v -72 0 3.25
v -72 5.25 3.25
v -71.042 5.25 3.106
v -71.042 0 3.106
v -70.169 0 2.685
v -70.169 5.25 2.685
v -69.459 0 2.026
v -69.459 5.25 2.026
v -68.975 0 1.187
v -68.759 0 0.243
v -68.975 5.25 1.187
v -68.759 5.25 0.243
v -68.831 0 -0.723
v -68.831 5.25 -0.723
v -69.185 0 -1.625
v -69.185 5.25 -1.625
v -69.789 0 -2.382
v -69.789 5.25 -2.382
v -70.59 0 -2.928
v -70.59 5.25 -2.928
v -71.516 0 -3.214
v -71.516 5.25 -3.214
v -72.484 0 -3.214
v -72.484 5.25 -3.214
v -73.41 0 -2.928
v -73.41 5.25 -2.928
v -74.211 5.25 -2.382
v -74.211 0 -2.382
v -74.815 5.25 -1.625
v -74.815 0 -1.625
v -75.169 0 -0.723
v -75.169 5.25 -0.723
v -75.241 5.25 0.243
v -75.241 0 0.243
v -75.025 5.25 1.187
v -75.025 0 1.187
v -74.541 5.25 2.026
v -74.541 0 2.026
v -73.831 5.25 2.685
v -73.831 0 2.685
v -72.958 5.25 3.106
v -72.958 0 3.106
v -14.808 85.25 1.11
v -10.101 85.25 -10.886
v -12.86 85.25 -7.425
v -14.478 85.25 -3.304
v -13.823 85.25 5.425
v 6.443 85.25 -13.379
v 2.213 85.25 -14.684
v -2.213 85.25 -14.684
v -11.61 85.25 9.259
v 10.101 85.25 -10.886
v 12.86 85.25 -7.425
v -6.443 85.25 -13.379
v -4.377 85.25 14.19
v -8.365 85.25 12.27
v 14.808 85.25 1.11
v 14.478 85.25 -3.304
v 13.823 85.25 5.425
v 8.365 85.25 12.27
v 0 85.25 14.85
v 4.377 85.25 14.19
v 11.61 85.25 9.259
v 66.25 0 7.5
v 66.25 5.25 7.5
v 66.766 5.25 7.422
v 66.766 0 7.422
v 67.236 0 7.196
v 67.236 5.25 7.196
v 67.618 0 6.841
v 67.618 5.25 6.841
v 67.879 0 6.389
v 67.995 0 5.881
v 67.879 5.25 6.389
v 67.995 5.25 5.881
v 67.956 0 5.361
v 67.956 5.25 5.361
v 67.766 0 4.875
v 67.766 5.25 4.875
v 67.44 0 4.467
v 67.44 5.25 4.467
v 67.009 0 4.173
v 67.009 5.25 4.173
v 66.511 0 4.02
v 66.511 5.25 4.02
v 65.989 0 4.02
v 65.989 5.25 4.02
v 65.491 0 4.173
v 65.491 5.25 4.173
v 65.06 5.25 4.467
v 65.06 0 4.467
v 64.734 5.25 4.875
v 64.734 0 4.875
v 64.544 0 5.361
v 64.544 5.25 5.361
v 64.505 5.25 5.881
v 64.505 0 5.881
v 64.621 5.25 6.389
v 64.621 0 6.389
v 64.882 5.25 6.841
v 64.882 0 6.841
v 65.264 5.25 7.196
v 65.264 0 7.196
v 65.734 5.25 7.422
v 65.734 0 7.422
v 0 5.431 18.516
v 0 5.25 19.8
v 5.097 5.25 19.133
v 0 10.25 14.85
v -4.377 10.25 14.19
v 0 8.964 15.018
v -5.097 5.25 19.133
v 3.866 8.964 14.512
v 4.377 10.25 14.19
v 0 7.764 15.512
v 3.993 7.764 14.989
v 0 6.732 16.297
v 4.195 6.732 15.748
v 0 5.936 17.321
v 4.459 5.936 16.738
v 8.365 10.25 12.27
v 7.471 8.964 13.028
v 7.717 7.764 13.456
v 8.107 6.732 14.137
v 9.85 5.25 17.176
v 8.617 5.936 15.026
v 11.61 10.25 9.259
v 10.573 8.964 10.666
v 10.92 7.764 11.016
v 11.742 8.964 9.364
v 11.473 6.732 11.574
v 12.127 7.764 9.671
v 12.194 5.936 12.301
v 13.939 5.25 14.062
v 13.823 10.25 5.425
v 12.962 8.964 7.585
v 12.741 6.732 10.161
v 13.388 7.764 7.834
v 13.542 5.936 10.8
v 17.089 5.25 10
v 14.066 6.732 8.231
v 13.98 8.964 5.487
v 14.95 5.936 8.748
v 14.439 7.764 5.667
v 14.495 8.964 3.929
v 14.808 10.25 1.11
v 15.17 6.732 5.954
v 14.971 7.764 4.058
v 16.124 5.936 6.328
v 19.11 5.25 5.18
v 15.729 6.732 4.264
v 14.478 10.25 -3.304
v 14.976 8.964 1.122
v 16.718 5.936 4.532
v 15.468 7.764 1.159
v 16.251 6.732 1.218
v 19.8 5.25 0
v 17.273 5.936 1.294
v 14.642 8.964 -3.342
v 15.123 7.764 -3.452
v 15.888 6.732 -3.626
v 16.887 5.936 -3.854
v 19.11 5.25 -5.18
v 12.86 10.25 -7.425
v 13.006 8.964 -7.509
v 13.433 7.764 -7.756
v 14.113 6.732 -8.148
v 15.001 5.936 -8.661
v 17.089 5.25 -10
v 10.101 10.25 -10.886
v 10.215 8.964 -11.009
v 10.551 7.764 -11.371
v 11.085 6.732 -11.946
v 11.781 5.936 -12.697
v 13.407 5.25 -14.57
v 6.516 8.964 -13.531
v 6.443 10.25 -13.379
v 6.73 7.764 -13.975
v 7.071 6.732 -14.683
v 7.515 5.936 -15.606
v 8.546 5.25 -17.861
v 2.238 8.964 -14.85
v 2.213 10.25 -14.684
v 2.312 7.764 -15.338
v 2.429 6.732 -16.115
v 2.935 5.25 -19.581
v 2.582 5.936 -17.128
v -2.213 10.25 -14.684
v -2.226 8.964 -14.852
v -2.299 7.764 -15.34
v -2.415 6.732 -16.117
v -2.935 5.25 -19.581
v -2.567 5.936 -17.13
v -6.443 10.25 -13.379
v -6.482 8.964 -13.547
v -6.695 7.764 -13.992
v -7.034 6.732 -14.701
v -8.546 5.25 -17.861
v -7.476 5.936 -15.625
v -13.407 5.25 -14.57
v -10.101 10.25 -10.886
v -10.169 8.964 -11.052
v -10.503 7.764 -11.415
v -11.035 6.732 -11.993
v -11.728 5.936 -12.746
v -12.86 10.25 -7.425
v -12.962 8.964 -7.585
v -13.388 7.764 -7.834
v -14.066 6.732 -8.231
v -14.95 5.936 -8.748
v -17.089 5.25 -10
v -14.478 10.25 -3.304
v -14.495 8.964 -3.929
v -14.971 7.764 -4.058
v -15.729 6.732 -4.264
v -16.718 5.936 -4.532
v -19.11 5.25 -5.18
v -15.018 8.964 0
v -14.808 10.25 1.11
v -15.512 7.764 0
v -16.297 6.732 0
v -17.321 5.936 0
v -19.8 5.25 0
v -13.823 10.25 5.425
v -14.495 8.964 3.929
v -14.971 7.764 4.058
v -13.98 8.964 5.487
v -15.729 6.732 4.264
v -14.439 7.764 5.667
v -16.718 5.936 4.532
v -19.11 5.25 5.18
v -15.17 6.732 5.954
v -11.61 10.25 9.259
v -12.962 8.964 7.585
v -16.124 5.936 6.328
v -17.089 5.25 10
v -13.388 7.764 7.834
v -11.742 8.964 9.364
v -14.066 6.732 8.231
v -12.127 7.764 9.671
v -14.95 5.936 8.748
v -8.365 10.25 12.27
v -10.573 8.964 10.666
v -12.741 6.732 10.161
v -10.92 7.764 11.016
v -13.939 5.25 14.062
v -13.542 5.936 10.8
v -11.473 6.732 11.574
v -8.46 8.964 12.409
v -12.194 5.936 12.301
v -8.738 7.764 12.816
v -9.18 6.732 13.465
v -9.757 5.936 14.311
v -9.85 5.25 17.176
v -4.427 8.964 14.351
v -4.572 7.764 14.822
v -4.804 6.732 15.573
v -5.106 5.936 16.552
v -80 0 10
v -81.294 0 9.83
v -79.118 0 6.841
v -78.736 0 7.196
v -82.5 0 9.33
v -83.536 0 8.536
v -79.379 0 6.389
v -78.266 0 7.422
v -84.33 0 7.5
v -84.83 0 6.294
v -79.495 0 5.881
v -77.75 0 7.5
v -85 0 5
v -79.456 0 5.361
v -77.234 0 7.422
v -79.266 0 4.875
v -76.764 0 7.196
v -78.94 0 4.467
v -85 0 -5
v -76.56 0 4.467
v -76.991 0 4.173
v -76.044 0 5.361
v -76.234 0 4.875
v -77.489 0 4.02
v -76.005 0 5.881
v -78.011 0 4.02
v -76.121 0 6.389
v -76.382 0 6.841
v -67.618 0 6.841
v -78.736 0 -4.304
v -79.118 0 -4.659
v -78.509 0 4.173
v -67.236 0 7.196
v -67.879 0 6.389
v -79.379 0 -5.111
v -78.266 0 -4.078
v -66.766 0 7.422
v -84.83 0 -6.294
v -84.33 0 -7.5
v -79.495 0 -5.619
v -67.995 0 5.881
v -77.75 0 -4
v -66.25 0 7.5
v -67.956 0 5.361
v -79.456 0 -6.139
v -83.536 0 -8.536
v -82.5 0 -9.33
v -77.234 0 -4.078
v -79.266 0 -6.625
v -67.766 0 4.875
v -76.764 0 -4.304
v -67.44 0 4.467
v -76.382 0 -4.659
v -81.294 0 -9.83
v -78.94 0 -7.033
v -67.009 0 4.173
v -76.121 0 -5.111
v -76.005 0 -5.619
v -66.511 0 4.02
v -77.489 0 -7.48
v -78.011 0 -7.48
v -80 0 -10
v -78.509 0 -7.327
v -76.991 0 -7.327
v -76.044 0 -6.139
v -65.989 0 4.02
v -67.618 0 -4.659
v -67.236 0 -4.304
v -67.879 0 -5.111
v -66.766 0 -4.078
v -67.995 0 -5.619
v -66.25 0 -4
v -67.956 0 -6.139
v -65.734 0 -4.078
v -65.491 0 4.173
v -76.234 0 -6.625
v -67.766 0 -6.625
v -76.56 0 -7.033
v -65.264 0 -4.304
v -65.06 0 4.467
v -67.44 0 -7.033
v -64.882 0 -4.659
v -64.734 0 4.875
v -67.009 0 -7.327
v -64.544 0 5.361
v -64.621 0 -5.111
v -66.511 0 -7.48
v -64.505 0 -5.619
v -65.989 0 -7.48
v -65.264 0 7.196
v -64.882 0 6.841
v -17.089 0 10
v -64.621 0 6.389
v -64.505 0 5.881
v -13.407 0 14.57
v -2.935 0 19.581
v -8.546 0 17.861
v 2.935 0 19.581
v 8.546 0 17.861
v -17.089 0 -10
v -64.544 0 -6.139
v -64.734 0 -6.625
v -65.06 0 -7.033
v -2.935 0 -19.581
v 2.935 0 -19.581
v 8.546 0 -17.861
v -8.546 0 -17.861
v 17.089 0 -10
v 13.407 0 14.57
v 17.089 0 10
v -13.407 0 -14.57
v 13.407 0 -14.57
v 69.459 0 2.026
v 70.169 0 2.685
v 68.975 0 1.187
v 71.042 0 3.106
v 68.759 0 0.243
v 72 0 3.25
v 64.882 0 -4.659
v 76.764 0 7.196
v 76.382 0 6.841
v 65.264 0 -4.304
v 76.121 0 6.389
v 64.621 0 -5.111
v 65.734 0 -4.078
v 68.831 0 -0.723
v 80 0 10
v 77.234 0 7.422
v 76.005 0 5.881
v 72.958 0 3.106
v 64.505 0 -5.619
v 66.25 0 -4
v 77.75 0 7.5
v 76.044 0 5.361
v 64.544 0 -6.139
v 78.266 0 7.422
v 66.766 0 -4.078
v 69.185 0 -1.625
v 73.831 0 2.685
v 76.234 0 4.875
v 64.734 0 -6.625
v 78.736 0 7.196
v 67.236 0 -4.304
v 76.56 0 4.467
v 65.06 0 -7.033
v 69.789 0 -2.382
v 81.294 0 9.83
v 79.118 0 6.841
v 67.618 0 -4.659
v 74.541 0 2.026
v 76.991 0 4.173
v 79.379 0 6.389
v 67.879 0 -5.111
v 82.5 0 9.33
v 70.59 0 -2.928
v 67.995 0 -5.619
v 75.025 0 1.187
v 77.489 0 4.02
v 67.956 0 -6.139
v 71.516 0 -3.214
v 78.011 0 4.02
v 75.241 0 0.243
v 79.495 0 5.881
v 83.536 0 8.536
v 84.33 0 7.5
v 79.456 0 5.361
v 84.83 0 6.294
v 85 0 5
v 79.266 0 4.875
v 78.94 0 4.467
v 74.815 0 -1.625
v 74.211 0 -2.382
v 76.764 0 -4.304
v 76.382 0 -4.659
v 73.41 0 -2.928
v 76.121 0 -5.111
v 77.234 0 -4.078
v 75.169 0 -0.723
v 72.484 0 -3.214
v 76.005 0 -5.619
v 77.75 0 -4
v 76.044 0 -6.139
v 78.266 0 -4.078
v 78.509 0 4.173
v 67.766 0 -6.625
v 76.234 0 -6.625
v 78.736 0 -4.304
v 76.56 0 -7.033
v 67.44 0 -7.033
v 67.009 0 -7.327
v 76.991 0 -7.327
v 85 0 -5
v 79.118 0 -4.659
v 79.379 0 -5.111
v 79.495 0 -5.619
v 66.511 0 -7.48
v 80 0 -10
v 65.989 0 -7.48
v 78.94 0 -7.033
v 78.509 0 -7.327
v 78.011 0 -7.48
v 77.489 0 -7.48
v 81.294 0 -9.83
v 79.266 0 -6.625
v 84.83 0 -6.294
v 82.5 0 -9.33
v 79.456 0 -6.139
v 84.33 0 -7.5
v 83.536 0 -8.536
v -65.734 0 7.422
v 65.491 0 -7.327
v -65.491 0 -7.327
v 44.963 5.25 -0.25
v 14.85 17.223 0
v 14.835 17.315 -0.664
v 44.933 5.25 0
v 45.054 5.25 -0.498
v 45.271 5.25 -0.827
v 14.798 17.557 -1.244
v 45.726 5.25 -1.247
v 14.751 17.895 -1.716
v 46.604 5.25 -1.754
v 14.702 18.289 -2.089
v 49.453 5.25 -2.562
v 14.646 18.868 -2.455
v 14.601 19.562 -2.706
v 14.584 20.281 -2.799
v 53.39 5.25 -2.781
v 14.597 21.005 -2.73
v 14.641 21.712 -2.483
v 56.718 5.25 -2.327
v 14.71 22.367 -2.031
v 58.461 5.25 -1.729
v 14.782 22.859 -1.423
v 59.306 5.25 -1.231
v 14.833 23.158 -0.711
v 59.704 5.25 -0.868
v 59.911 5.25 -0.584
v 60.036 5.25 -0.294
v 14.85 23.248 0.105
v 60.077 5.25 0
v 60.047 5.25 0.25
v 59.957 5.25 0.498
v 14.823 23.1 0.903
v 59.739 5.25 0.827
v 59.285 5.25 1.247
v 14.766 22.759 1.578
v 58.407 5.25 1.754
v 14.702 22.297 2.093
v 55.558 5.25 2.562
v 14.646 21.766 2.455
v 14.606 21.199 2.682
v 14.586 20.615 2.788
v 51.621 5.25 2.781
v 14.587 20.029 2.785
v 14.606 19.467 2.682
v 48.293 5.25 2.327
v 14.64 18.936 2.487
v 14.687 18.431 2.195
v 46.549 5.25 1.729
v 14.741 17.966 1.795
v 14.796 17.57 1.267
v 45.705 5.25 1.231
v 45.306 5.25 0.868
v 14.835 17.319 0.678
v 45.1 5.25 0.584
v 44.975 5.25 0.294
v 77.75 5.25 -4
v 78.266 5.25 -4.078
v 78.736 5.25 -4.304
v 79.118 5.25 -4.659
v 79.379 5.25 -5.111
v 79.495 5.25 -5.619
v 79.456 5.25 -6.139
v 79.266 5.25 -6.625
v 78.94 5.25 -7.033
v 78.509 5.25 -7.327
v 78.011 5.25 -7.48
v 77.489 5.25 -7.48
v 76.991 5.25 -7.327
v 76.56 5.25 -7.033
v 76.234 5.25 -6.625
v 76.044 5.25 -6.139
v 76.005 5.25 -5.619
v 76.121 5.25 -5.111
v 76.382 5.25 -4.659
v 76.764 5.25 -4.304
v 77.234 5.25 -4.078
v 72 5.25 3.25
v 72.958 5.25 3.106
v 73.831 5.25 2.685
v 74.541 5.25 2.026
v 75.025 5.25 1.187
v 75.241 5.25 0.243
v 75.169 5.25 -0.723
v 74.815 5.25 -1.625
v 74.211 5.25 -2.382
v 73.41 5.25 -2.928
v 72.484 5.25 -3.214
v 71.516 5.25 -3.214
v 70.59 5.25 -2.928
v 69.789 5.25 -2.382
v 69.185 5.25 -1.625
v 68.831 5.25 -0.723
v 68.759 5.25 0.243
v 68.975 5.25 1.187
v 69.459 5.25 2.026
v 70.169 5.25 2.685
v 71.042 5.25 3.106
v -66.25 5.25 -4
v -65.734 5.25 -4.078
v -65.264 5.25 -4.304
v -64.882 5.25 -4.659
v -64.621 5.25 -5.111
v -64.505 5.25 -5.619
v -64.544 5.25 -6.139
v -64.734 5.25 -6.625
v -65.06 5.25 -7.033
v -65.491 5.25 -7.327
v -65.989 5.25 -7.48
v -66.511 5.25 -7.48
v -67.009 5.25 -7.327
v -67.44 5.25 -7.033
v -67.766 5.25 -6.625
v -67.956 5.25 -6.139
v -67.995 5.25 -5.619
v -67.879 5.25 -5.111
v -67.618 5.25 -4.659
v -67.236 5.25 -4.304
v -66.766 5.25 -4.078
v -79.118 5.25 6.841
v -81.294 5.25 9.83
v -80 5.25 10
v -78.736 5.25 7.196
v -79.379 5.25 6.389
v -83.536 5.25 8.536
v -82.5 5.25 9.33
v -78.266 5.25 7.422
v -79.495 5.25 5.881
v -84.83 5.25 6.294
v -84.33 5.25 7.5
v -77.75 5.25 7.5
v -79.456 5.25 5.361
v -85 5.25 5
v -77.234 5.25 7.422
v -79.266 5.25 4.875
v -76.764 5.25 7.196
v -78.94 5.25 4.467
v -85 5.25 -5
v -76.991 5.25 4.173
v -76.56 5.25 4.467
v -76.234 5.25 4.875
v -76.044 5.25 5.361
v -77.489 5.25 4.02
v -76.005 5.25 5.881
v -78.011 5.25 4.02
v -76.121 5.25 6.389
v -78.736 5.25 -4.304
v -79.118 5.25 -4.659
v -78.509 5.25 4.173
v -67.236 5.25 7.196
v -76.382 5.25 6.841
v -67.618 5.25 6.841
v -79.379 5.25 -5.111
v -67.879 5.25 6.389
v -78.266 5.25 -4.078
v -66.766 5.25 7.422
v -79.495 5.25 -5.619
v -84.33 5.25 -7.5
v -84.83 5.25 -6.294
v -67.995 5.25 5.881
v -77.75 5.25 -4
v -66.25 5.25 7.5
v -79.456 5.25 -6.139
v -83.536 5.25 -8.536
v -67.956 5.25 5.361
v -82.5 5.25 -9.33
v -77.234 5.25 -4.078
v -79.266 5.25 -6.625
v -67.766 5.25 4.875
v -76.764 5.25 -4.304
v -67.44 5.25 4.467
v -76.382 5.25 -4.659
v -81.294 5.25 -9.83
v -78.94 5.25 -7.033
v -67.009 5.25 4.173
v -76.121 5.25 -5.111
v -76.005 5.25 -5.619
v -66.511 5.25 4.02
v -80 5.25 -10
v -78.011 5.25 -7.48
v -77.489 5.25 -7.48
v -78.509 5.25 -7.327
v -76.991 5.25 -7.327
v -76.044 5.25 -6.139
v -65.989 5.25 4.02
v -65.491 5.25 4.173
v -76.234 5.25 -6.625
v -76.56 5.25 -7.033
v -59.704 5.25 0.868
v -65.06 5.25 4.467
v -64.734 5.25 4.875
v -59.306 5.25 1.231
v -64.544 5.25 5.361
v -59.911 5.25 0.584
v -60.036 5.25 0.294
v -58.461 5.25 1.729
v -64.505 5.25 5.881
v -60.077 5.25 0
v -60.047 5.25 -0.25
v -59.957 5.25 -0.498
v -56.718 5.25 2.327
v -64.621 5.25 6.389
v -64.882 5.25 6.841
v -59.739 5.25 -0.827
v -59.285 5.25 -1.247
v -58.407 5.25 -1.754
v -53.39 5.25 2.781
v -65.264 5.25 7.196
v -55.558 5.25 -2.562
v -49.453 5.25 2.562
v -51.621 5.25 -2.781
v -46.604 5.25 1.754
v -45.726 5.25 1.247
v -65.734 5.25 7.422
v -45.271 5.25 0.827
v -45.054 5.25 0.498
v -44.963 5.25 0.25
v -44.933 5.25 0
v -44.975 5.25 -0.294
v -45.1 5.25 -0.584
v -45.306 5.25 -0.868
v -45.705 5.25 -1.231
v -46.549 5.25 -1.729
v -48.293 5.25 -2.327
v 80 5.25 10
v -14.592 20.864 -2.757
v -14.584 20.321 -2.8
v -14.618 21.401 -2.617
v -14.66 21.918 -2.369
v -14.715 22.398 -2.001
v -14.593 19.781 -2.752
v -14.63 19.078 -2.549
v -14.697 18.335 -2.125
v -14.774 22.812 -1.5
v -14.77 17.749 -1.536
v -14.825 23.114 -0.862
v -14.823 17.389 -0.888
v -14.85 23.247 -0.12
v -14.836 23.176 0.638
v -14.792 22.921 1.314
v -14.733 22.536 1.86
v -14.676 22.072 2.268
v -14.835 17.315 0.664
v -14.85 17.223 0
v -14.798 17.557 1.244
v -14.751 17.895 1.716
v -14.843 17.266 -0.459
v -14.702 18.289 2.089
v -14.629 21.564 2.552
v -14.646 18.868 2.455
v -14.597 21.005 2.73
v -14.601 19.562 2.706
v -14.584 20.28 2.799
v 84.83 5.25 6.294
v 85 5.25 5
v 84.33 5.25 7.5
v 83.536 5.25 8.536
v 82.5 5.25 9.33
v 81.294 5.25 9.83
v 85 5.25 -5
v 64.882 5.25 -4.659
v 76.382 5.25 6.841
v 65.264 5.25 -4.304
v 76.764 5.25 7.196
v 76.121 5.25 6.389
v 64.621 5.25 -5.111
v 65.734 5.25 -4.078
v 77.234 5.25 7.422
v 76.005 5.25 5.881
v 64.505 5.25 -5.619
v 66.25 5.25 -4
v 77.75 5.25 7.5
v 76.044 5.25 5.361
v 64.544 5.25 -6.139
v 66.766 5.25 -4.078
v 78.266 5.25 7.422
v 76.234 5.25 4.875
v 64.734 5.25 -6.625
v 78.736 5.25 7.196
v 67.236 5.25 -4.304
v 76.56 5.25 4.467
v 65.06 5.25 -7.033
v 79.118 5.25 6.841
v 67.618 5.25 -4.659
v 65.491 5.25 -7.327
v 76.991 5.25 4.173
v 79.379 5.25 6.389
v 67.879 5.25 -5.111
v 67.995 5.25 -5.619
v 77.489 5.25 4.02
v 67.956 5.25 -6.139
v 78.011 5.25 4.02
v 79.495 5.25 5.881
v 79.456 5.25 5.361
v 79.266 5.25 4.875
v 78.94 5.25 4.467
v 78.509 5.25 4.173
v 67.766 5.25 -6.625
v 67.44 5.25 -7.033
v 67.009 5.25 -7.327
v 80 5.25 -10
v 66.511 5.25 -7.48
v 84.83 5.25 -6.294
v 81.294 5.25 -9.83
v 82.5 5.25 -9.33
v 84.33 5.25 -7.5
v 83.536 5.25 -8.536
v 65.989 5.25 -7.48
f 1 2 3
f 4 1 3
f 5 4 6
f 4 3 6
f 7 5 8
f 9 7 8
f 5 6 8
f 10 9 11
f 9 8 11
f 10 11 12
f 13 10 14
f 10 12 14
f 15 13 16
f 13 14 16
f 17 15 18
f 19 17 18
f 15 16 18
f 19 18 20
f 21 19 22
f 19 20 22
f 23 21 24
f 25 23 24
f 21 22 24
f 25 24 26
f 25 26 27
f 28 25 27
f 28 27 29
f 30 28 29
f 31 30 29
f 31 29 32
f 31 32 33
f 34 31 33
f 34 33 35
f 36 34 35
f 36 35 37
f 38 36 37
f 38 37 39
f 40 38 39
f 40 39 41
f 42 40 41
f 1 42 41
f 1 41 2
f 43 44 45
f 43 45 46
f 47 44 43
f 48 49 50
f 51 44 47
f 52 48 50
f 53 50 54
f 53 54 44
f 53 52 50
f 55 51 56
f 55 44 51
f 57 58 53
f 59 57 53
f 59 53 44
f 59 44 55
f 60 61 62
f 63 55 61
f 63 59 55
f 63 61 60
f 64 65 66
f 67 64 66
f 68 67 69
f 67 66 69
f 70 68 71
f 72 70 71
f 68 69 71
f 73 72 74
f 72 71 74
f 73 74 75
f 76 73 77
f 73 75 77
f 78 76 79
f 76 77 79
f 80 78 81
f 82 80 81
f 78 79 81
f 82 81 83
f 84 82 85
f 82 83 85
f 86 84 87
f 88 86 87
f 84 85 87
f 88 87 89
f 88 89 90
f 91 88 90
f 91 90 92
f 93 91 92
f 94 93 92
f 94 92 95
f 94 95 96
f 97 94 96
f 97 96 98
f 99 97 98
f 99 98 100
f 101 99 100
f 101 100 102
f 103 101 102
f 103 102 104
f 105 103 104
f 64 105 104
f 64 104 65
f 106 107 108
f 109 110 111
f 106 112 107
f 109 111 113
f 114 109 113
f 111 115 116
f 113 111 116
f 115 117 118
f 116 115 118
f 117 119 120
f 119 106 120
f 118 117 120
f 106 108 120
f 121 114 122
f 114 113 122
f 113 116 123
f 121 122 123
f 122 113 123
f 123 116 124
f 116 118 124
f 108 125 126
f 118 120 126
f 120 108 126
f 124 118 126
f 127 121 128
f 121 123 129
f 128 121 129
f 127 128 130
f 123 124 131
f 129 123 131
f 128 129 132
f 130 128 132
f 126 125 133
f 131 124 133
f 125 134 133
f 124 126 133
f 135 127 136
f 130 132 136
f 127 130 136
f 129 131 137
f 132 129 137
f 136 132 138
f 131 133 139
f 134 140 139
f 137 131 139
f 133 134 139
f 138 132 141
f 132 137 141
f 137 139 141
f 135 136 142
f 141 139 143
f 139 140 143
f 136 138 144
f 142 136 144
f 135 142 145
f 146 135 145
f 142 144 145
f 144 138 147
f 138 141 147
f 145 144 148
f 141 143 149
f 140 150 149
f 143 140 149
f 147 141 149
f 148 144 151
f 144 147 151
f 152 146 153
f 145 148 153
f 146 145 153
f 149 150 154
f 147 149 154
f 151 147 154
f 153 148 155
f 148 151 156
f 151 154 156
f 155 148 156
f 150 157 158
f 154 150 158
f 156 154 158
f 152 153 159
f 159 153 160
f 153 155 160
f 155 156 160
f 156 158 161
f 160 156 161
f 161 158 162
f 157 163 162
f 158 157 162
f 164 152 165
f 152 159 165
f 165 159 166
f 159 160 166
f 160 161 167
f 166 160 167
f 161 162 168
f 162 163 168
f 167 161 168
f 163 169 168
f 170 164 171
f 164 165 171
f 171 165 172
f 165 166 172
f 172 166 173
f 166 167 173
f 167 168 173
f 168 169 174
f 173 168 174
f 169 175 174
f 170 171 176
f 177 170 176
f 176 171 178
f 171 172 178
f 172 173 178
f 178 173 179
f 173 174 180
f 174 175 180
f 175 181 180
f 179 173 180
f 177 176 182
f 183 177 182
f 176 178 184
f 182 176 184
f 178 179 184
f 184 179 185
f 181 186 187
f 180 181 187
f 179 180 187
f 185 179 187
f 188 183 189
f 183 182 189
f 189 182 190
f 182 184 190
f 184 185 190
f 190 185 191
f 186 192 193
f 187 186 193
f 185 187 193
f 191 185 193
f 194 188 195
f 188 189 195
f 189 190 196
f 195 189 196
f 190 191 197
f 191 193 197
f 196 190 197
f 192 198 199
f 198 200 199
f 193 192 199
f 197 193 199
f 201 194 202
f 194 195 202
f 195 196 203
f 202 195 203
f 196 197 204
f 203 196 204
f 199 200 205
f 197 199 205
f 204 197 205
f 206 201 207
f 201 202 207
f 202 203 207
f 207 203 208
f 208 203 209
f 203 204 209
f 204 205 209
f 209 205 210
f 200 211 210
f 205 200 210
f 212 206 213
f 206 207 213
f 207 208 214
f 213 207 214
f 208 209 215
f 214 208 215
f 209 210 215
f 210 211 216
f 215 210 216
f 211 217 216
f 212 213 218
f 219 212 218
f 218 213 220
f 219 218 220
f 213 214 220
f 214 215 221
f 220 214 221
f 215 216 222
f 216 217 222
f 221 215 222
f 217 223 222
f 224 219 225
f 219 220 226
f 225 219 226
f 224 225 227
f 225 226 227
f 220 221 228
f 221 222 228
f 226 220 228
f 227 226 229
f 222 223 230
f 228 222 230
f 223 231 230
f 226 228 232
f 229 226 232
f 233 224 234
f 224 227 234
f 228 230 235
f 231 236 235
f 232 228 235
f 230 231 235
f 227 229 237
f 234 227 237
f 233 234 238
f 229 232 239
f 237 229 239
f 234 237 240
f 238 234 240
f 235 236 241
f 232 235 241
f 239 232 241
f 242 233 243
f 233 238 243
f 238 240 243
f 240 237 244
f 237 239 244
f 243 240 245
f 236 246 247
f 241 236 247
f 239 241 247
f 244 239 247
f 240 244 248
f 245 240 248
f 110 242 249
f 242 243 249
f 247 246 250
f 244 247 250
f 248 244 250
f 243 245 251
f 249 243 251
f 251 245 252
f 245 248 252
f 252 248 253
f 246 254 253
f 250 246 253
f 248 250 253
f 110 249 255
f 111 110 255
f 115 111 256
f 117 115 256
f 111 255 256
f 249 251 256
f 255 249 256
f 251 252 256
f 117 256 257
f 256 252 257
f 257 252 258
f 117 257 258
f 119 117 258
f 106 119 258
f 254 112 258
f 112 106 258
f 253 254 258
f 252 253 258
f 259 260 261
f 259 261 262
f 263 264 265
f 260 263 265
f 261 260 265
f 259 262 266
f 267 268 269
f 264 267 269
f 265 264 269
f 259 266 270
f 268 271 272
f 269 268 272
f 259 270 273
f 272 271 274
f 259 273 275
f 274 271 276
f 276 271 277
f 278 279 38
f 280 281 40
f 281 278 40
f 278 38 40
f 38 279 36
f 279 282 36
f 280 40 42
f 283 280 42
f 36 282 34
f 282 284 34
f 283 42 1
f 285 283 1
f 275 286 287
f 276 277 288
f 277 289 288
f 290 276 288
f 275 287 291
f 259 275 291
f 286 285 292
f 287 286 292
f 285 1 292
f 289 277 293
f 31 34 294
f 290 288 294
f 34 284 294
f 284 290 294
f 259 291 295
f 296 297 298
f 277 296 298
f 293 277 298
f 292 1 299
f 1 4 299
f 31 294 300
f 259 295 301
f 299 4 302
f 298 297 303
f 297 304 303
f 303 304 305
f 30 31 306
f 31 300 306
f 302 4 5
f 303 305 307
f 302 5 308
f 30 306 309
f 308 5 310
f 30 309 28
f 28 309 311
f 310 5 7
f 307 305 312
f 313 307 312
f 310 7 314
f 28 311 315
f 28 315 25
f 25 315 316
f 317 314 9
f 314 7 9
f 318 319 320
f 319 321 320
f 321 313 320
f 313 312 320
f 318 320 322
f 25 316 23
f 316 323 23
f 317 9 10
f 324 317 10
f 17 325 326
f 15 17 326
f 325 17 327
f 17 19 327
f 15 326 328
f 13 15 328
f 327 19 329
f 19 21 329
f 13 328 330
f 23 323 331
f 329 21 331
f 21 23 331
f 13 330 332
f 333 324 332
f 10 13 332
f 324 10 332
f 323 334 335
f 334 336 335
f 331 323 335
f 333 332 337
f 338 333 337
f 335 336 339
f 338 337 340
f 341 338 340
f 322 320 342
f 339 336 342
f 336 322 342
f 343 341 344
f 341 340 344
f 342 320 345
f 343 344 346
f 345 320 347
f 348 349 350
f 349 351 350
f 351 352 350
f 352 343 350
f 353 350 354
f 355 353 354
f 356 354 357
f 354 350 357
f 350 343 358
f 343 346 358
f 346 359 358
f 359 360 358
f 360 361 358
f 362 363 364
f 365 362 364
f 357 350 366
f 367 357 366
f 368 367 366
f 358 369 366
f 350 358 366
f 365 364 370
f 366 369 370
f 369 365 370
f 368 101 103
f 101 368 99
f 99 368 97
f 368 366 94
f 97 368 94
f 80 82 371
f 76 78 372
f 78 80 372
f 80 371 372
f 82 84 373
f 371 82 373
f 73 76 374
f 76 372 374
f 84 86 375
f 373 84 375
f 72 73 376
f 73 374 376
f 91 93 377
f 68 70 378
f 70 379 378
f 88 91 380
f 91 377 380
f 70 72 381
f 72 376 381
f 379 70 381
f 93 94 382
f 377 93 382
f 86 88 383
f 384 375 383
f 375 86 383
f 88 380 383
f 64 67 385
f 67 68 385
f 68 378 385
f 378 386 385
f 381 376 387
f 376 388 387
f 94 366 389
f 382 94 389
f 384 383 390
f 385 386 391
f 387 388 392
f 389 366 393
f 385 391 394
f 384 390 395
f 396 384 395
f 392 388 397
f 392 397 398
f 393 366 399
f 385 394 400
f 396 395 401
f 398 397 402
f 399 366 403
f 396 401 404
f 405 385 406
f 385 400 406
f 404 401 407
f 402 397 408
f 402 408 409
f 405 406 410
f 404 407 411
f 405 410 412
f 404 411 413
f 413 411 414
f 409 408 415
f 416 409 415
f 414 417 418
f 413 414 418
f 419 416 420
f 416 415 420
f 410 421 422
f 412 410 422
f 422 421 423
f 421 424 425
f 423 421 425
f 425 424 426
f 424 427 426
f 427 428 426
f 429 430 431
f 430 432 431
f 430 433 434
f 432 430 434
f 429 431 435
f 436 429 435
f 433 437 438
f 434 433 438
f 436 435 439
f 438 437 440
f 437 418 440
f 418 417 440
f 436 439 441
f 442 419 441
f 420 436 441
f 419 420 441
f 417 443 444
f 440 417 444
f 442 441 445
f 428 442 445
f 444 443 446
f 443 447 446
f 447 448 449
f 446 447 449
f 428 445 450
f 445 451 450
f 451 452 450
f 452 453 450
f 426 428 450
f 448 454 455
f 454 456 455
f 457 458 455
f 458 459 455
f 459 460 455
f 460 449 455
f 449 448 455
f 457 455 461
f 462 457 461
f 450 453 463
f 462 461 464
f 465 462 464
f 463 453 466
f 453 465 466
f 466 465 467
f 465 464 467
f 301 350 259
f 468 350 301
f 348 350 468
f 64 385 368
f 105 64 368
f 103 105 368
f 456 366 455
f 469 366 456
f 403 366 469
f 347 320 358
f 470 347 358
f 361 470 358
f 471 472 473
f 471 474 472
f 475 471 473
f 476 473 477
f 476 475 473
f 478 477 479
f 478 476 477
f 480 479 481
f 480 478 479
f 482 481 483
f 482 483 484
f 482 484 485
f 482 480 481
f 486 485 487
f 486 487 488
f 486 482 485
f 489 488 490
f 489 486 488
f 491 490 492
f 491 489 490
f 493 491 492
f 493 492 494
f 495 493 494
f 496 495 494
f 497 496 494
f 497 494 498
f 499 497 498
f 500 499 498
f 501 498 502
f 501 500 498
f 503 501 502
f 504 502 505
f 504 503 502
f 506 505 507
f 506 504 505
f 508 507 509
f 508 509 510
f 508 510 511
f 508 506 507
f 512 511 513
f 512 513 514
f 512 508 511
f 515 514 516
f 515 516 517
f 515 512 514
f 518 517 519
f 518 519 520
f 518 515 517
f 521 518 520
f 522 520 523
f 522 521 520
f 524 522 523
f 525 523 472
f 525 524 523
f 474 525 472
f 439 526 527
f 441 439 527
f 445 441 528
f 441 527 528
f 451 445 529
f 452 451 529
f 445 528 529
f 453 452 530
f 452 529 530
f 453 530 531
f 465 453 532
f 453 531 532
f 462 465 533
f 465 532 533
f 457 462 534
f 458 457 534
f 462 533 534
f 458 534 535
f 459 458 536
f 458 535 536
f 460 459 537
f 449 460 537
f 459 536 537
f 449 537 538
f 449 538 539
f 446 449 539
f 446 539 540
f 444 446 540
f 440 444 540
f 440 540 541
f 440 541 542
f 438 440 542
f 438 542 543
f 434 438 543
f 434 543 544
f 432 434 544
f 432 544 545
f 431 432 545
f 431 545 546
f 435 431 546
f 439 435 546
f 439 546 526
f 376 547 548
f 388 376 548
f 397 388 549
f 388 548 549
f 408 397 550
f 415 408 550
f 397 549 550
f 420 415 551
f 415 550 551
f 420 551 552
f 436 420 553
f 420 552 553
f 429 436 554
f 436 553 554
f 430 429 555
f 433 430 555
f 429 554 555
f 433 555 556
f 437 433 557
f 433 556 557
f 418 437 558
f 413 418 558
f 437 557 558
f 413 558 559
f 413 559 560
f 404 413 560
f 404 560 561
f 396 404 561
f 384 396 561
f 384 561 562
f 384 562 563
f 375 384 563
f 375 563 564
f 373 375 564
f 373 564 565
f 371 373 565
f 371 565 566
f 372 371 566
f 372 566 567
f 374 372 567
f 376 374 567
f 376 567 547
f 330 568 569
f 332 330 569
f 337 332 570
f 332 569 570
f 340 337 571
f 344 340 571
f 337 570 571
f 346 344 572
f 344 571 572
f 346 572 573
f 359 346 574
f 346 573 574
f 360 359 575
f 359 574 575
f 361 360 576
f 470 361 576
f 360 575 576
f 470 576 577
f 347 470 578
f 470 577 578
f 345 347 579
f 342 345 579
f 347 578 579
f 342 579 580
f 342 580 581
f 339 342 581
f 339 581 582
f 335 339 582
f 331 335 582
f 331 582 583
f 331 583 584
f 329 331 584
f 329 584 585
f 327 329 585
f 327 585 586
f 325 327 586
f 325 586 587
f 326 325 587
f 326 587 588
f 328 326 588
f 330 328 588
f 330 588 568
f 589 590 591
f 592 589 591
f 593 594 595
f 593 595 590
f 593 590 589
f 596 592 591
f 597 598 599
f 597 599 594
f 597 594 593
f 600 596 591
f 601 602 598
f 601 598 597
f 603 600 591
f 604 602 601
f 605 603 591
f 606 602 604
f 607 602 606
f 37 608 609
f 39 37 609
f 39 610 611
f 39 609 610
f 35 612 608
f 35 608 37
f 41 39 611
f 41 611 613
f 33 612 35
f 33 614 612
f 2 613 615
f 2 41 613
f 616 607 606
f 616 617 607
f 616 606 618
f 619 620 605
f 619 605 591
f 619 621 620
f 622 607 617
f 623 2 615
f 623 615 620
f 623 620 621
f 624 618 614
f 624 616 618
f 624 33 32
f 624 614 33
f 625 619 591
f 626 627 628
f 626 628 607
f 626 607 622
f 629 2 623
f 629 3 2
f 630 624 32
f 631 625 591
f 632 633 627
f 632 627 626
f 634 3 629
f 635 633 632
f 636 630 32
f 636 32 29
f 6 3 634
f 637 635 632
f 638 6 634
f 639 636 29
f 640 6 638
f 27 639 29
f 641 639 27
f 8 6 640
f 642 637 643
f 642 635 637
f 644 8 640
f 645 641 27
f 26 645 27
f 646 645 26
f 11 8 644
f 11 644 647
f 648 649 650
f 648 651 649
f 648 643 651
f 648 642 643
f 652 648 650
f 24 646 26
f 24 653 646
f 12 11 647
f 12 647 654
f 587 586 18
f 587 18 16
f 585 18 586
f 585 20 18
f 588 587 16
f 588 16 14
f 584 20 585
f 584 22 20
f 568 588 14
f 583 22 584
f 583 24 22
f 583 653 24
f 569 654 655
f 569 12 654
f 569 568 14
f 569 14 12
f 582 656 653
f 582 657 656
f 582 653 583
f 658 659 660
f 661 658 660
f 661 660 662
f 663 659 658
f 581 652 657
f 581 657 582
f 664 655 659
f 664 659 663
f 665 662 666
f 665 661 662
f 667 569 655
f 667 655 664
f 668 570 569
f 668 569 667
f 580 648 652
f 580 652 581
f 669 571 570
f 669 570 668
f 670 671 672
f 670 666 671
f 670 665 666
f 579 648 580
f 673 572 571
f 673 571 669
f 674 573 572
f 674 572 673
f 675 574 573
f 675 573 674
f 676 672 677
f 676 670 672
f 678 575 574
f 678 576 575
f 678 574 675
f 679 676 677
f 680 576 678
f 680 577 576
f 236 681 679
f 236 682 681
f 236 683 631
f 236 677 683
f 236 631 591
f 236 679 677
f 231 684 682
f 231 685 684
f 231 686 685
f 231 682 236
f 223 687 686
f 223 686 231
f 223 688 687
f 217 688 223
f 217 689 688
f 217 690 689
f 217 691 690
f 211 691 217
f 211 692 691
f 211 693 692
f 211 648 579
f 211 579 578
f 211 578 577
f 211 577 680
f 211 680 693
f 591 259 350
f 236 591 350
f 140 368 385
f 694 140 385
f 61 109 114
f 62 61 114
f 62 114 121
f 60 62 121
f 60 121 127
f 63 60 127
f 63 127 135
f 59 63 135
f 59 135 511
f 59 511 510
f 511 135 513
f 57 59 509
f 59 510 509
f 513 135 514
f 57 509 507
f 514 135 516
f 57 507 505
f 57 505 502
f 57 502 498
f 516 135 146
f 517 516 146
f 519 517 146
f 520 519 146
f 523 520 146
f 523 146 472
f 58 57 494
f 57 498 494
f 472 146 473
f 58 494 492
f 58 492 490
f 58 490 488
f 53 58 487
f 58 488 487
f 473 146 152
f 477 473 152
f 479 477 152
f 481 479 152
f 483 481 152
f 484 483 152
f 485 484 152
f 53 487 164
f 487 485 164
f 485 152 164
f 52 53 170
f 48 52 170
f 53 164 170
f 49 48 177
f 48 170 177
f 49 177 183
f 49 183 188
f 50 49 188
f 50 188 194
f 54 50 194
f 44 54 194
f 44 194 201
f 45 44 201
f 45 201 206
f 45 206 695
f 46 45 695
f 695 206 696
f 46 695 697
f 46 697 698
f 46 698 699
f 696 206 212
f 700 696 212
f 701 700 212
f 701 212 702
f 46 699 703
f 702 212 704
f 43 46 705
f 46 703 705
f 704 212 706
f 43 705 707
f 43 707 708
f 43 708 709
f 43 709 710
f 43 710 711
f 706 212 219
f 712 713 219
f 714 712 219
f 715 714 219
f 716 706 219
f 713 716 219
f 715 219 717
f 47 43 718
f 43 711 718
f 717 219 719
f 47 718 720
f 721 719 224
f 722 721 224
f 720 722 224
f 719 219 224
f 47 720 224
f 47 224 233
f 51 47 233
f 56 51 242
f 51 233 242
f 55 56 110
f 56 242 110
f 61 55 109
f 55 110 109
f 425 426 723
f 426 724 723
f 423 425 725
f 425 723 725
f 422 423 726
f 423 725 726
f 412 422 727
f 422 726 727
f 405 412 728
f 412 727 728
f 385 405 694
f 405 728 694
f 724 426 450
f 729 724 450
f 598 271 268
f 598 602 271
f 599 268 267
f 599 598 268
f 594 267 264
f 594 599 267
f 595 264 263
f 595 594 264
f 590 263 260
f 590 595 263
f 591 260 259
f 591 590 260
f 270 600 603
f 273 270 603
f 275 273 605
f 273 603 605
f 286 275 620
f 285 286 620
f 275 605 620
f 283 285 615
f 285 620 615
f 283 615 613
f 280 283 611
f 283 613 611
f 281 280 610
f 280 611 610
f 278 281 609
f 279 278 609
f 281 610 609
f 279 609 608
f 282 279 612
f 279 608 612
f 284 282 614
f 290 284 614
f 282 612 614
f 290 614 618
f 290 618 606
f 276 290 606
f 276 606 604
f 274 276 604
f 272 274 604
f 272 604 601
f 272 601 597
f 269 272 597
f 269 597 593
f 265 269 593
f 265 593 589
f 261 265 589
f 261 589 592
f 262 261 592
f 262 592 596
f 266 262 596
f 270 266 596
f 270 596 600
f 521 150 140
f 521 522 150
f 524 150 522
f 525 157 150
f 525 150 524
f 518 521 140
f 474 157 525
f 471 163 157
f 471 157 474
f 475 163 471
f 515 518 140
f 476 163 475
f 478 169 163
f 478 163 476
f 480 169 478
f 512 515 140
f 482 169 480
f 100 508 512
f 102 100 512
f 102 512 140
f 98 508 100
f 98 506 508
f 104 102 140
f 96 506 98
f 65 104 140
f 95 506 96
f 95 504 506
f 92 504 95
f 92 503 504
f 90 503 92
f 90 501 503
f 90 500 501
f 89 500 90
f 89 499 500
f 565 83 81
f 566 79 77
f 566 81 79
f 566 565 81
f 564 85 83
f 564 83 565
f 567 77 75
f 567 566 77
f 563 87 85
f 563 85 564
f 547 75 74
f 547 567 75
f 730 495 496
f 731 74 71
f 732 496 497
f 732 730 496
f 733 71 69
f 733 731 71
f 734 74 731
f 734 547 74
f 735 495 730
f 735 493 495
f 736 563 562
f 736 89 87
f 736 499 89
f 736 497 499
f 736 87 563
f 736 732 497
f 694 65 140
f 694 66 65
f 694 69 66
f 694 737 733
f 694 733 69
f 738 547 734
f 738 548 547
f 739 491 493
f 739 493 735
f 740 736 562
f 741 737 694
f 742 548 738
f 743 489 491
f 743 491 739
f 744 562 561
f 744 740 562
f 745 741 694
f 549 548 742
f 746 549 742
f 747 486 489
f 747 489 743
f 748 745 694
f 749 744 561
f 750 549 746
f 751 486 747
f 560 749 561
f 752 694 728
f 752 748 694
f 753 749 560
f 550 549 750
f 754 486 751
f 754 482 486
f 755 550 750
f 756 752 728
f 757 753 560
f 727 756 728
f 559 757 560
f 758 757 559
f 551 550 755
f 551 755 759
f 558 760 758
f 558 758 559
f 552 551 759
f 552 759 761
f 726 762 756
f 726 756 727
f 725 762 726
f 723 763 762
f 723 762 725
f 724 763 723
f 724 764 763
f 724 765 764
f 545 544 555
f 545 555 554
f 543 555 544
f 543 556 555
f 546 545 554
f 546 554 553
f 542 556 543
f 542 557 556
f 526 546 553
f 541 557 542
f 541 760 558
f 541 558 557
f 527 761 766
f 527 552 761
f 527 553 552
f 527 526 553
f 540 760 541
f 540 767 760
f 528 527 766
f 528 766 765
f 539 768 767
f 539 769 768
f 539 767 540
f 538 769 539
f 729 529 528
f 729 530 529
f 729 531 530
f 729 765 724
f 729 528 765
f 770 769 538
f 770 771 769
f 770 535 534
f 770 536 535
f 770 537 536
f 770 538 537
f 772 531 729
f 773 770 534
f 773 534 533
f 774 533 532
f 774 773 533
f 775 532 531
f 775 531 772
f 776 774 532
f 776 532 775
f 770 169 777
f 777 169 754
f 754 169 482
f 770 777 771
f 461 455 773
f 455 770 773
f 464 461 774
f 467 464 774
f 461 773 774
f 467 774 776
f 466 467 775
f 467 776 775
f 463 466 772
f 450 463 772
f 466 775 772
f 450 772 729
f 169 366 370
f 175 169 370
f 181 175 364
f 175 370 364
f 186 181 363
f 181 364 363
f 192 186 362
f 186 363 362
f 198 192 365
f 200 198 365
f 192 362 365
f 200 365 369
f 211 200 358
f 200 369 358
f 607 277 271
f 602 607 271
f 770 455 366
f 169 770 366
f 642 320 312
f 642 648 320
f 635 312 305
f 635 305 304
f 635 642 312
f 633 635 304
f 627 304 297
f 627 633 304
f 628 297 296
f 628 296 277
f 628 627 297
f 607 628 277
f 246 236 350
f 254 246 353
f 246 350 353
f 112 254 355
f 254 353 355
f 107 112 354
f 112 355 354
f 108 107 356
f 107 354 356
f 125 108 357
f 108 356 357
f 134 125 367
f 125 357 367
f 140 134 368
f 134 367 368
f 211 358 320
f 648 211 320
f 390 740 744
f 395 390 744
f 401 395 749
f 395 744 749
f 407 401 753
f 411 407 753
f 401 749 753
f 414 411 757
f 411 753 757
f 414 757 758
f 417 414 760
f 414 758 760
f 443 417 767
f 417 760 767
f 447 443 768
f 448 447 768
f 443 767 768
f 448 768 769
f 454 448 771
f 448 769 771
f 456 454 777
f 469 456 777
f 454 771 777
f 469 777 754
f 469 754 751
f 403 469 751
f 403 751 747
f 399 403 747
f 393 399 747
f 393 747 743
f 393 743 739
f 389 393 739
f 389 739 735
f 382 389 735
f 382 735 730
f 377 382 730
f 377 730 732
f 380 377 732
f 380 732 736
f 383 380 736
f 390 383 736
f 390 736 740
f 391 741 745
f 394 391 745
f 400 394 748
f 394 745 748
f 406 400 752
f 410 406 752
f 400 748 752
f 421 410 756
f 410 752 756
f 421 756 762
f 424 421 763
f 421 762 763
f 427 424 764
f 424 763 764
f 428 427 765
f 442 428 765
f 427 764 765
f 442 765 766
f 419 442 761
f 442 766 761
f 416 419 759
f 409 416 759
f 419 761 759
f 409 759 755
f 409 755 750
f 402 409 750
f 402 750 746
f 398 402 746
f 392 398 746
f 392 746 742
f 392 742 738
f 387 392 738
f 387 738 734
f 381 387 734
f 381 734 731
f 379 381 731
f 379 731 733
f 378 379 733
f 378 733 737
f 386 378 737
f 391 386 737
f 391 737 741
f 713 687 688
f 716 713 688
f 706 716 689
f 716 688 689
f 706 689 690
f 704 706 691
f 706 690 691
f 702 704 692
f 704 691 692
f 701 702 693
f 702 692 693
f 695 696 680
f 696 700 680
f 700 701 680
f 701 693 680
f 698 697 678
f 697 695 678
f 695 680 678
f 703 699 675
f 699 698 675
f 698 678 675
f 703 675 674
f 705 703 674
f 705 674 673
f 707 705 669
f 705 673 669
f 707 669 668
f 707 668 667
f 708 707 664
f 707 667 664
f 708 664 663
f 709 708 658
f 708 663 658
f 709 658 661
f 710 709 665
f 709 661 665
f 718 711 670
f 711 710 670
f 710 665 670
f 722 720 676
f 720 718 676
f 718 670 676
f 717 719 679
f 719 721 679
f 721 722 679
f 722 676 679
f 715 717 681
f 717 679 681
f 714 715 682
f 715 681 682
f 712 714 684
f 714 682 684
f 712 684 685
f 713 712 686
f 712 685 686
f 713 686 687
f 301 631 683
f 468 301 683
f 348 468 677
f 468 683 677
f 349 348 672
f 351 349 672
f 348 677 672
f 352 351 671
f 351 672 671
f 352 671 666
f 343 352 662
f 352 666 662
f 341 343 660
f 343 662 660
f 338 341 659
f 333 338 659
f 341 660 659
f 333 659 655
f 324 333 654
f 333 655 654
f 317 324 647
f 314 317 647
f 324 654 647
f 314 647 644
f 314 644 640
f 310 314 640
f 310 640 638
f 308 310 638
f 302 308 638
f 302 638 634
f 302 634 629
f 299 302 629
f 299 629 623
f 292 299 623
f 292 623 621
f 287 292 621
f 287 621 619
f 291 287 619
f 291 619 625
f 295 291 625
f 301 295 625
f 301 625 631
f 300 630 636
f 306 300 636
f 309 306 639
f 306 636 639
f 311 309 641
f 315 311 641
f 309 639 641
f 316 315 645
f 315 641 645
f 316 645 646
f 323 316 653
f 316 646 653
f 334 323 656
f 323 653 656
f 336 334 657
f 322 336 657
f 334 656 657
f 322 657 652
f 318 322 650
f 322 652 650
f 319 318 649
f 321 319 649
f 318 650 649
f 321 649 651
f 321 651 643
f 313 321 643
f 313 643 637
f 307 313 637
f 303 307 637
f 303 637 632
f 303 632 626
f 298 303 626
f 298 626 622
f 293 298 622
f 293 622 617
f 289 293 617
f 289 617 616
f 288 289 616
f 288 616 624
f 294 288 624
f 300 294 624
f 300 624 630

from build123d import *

# Parameters (mm, degrees)
BOSS_EXTRUDE1_DEPTH = 5.25
SKETCH3_R           = 14.850000000000001
BOSS_EXTRUDE2_DEPTH = 80
SKETCH2_R           = 1.749999999999997
SKETCH2_R_2         = 3.250000000000007
CUT_EXTRUDE1_DEPTH  = 119.39358090707452
FILLET8_R           = 5
FILLET9_R           = 5


with BuildPart() as part:
    # Sketch1 → Boss-Extrude1 (new body)
    with BuildSketch(Plane(origin=(0, 0, 0), x_dir=(1, 0, 0), z_dir=(0, 1, 0))):
        with BuildLine():
            Line((-85, -10.000000000000002), (-17.089177862027185, -10))
            ThreePointArc((-17.089177862027185, -10), (1.11e-15, -19.8), (17.089177862027185, -10))
            Line((17.089177862027185, -10), (85, -10.000000000000002))
            Line((85, -10.000000000000002), (85, 10))
            Line((85, 10), (17.089177862027185, 10))
            ThreePointArc((17.089177862027185, 10), (1.11e-15, 19.8), (-17.089177862027185, 10))
            Line((-17.089177862027185, 10), (-85, 10))
            Line((-85, 10), (-85, -10.000000000000002))
        make_face()
    extrude(amount=BOSS_EXTRUDE1_DEPTH)

    # Sketch3 → Boss-Extrude2 (add)
    with BuildSketch(Plane(origin=(0, 5.25, 0), x_dir=(1, 0, 0), z_dir=(0, 1, 0))):
        with Locations(Location((0, 0, 0), (0, 0, 270))):
            Circle(SKETCH3_R)
    extrude(amount=BOSS_EXTRUDE2_DEPTH)

    # Sketch2 → Cut-Extrude1 (cut, through all)
    with BuildSketch(Plane(origin=(0, 5.25, 0), x_dir=(1, 0, 0), z_dir=(0, 1, 0))):
        with Locations(Location((-77.75, 5.7499999999999964, 0), (0, 0, 270))):
            Circle(SKETCH2_R)
        with Locations(Location((-66.25, 5.7499999999999964, 0), (0, 0, 270))):
            Circle(SKETCH2_R)
        with Locations(Location((-66.25, -5.75, 0), (0, 0, 270))):
            Circle(SKETCH2_R)
        with Locations(Location((-77.75, -5.75, 0), (0, 0, 270))):
            Circle(SKETCH2_R)
        with Locations(Location((77.75, -5.75, 0), (0, 0, 270))):
            Circle(SKETCH2_R)
        with Locations(Location((66.25, -5.75, 0), (0, 0, 270))):
            Circle(SKETCH2_R)
        with Locations(Location((77.75, 5.7499999999999964, 0), (0, 0, 270))):
            Circle(SKETCH2_R)
        with Locations(Location((66.25, 5.7499999999999964, 0), (0, 0, 270))):
            Circle(SKETCH2_R)
        with Locations(Location((-72, -2.87e-15, 0), (0, 0, 270))):
            Circle(SKETCH2_R_2)
        with Locations(Location((72, -2.87e-15, 0), (0, 0, 270))):
            Circle(SKETCH2_R_2)
    extrude(amount=-CUT_EXTRUDE1_DEPTH, mode=Mode.SUBTRACT)

    # Sketch5 one side → Revolve1 (revolve)
    with BuildSketch(Plane.XY, mode=Mode.PRIVATE) as revolve1_sk:
        Polygon((-14.850000000000001, 20.23639427704437), (-14.850000000000001, 23.25), (-60.077367189450115, 5.2500000000000036), (-59.041984669000975, 2.648465253672675), align=None)
    revolve1 = revolve(revolve1_sk.sketch.rotate(Axis((-59.041984669000975, 2.648465253672677, 0), (0.9291195522597585, 0.3697794715889807, 0)), 180), axis=Axis((-59.041984669000975, 2.648465253672677, 0), (0.9291195522597585, 0.3697794715889807, 0)))

    # Fillet8
    fillet8_edges = [part.edges().sort_by_distance(p)[0] for p in [
        (85, 2.625, -10),
        (85, 2.625, 10.000000000000002),
        (-85, 2.625, 10.000000000000002),
        (-85, 2.625, -10),
    ]]
    fillet(fillet8_edges, radius=FILLET8_R)

    # Mirror1: Revolve1 across plane
    add(revolve1.mirror(Plane.ZY))

    # Fillet9
    # the kernel refuses this fillet: 5 mm, written as the material it adds along each edge
    with BuildSketch(Plane(origin=(0, 5.25, 0), x_dir=(-1.8e-16, 0, 1), z_dir=(-1, 0, -1.8e-16))) as fillet9_piece_1:
        with BuildLine():
            CenterArc((19.85, 4.99974999375026), FILLET9_R, 180, 89.42703265514302)
            Line((14.850000000000001, 4.99974999375026), (14.750000000000002, 4.99974999375026))
            Line((14.750000000000002, 4.99974999375026), (14.750000000000002, 0))
            Line((14.750000000000002, 0), (14.850000000000001, -0.09999999999999964))
            ThreePointArc((14.850000000000001, -0.09999999999999964), (17.32500000000001, -0.09999999999999964), (19.799000000000017, -0.09999499987442118))
            Line((19.799000000000017, -0.09999499987442118), (19.80000000000002, 5.7288e-13))
        make_face()
    revolve(axis=Axis((0, 5.25, 0), (0, 1, 0)))


solid = part.part
